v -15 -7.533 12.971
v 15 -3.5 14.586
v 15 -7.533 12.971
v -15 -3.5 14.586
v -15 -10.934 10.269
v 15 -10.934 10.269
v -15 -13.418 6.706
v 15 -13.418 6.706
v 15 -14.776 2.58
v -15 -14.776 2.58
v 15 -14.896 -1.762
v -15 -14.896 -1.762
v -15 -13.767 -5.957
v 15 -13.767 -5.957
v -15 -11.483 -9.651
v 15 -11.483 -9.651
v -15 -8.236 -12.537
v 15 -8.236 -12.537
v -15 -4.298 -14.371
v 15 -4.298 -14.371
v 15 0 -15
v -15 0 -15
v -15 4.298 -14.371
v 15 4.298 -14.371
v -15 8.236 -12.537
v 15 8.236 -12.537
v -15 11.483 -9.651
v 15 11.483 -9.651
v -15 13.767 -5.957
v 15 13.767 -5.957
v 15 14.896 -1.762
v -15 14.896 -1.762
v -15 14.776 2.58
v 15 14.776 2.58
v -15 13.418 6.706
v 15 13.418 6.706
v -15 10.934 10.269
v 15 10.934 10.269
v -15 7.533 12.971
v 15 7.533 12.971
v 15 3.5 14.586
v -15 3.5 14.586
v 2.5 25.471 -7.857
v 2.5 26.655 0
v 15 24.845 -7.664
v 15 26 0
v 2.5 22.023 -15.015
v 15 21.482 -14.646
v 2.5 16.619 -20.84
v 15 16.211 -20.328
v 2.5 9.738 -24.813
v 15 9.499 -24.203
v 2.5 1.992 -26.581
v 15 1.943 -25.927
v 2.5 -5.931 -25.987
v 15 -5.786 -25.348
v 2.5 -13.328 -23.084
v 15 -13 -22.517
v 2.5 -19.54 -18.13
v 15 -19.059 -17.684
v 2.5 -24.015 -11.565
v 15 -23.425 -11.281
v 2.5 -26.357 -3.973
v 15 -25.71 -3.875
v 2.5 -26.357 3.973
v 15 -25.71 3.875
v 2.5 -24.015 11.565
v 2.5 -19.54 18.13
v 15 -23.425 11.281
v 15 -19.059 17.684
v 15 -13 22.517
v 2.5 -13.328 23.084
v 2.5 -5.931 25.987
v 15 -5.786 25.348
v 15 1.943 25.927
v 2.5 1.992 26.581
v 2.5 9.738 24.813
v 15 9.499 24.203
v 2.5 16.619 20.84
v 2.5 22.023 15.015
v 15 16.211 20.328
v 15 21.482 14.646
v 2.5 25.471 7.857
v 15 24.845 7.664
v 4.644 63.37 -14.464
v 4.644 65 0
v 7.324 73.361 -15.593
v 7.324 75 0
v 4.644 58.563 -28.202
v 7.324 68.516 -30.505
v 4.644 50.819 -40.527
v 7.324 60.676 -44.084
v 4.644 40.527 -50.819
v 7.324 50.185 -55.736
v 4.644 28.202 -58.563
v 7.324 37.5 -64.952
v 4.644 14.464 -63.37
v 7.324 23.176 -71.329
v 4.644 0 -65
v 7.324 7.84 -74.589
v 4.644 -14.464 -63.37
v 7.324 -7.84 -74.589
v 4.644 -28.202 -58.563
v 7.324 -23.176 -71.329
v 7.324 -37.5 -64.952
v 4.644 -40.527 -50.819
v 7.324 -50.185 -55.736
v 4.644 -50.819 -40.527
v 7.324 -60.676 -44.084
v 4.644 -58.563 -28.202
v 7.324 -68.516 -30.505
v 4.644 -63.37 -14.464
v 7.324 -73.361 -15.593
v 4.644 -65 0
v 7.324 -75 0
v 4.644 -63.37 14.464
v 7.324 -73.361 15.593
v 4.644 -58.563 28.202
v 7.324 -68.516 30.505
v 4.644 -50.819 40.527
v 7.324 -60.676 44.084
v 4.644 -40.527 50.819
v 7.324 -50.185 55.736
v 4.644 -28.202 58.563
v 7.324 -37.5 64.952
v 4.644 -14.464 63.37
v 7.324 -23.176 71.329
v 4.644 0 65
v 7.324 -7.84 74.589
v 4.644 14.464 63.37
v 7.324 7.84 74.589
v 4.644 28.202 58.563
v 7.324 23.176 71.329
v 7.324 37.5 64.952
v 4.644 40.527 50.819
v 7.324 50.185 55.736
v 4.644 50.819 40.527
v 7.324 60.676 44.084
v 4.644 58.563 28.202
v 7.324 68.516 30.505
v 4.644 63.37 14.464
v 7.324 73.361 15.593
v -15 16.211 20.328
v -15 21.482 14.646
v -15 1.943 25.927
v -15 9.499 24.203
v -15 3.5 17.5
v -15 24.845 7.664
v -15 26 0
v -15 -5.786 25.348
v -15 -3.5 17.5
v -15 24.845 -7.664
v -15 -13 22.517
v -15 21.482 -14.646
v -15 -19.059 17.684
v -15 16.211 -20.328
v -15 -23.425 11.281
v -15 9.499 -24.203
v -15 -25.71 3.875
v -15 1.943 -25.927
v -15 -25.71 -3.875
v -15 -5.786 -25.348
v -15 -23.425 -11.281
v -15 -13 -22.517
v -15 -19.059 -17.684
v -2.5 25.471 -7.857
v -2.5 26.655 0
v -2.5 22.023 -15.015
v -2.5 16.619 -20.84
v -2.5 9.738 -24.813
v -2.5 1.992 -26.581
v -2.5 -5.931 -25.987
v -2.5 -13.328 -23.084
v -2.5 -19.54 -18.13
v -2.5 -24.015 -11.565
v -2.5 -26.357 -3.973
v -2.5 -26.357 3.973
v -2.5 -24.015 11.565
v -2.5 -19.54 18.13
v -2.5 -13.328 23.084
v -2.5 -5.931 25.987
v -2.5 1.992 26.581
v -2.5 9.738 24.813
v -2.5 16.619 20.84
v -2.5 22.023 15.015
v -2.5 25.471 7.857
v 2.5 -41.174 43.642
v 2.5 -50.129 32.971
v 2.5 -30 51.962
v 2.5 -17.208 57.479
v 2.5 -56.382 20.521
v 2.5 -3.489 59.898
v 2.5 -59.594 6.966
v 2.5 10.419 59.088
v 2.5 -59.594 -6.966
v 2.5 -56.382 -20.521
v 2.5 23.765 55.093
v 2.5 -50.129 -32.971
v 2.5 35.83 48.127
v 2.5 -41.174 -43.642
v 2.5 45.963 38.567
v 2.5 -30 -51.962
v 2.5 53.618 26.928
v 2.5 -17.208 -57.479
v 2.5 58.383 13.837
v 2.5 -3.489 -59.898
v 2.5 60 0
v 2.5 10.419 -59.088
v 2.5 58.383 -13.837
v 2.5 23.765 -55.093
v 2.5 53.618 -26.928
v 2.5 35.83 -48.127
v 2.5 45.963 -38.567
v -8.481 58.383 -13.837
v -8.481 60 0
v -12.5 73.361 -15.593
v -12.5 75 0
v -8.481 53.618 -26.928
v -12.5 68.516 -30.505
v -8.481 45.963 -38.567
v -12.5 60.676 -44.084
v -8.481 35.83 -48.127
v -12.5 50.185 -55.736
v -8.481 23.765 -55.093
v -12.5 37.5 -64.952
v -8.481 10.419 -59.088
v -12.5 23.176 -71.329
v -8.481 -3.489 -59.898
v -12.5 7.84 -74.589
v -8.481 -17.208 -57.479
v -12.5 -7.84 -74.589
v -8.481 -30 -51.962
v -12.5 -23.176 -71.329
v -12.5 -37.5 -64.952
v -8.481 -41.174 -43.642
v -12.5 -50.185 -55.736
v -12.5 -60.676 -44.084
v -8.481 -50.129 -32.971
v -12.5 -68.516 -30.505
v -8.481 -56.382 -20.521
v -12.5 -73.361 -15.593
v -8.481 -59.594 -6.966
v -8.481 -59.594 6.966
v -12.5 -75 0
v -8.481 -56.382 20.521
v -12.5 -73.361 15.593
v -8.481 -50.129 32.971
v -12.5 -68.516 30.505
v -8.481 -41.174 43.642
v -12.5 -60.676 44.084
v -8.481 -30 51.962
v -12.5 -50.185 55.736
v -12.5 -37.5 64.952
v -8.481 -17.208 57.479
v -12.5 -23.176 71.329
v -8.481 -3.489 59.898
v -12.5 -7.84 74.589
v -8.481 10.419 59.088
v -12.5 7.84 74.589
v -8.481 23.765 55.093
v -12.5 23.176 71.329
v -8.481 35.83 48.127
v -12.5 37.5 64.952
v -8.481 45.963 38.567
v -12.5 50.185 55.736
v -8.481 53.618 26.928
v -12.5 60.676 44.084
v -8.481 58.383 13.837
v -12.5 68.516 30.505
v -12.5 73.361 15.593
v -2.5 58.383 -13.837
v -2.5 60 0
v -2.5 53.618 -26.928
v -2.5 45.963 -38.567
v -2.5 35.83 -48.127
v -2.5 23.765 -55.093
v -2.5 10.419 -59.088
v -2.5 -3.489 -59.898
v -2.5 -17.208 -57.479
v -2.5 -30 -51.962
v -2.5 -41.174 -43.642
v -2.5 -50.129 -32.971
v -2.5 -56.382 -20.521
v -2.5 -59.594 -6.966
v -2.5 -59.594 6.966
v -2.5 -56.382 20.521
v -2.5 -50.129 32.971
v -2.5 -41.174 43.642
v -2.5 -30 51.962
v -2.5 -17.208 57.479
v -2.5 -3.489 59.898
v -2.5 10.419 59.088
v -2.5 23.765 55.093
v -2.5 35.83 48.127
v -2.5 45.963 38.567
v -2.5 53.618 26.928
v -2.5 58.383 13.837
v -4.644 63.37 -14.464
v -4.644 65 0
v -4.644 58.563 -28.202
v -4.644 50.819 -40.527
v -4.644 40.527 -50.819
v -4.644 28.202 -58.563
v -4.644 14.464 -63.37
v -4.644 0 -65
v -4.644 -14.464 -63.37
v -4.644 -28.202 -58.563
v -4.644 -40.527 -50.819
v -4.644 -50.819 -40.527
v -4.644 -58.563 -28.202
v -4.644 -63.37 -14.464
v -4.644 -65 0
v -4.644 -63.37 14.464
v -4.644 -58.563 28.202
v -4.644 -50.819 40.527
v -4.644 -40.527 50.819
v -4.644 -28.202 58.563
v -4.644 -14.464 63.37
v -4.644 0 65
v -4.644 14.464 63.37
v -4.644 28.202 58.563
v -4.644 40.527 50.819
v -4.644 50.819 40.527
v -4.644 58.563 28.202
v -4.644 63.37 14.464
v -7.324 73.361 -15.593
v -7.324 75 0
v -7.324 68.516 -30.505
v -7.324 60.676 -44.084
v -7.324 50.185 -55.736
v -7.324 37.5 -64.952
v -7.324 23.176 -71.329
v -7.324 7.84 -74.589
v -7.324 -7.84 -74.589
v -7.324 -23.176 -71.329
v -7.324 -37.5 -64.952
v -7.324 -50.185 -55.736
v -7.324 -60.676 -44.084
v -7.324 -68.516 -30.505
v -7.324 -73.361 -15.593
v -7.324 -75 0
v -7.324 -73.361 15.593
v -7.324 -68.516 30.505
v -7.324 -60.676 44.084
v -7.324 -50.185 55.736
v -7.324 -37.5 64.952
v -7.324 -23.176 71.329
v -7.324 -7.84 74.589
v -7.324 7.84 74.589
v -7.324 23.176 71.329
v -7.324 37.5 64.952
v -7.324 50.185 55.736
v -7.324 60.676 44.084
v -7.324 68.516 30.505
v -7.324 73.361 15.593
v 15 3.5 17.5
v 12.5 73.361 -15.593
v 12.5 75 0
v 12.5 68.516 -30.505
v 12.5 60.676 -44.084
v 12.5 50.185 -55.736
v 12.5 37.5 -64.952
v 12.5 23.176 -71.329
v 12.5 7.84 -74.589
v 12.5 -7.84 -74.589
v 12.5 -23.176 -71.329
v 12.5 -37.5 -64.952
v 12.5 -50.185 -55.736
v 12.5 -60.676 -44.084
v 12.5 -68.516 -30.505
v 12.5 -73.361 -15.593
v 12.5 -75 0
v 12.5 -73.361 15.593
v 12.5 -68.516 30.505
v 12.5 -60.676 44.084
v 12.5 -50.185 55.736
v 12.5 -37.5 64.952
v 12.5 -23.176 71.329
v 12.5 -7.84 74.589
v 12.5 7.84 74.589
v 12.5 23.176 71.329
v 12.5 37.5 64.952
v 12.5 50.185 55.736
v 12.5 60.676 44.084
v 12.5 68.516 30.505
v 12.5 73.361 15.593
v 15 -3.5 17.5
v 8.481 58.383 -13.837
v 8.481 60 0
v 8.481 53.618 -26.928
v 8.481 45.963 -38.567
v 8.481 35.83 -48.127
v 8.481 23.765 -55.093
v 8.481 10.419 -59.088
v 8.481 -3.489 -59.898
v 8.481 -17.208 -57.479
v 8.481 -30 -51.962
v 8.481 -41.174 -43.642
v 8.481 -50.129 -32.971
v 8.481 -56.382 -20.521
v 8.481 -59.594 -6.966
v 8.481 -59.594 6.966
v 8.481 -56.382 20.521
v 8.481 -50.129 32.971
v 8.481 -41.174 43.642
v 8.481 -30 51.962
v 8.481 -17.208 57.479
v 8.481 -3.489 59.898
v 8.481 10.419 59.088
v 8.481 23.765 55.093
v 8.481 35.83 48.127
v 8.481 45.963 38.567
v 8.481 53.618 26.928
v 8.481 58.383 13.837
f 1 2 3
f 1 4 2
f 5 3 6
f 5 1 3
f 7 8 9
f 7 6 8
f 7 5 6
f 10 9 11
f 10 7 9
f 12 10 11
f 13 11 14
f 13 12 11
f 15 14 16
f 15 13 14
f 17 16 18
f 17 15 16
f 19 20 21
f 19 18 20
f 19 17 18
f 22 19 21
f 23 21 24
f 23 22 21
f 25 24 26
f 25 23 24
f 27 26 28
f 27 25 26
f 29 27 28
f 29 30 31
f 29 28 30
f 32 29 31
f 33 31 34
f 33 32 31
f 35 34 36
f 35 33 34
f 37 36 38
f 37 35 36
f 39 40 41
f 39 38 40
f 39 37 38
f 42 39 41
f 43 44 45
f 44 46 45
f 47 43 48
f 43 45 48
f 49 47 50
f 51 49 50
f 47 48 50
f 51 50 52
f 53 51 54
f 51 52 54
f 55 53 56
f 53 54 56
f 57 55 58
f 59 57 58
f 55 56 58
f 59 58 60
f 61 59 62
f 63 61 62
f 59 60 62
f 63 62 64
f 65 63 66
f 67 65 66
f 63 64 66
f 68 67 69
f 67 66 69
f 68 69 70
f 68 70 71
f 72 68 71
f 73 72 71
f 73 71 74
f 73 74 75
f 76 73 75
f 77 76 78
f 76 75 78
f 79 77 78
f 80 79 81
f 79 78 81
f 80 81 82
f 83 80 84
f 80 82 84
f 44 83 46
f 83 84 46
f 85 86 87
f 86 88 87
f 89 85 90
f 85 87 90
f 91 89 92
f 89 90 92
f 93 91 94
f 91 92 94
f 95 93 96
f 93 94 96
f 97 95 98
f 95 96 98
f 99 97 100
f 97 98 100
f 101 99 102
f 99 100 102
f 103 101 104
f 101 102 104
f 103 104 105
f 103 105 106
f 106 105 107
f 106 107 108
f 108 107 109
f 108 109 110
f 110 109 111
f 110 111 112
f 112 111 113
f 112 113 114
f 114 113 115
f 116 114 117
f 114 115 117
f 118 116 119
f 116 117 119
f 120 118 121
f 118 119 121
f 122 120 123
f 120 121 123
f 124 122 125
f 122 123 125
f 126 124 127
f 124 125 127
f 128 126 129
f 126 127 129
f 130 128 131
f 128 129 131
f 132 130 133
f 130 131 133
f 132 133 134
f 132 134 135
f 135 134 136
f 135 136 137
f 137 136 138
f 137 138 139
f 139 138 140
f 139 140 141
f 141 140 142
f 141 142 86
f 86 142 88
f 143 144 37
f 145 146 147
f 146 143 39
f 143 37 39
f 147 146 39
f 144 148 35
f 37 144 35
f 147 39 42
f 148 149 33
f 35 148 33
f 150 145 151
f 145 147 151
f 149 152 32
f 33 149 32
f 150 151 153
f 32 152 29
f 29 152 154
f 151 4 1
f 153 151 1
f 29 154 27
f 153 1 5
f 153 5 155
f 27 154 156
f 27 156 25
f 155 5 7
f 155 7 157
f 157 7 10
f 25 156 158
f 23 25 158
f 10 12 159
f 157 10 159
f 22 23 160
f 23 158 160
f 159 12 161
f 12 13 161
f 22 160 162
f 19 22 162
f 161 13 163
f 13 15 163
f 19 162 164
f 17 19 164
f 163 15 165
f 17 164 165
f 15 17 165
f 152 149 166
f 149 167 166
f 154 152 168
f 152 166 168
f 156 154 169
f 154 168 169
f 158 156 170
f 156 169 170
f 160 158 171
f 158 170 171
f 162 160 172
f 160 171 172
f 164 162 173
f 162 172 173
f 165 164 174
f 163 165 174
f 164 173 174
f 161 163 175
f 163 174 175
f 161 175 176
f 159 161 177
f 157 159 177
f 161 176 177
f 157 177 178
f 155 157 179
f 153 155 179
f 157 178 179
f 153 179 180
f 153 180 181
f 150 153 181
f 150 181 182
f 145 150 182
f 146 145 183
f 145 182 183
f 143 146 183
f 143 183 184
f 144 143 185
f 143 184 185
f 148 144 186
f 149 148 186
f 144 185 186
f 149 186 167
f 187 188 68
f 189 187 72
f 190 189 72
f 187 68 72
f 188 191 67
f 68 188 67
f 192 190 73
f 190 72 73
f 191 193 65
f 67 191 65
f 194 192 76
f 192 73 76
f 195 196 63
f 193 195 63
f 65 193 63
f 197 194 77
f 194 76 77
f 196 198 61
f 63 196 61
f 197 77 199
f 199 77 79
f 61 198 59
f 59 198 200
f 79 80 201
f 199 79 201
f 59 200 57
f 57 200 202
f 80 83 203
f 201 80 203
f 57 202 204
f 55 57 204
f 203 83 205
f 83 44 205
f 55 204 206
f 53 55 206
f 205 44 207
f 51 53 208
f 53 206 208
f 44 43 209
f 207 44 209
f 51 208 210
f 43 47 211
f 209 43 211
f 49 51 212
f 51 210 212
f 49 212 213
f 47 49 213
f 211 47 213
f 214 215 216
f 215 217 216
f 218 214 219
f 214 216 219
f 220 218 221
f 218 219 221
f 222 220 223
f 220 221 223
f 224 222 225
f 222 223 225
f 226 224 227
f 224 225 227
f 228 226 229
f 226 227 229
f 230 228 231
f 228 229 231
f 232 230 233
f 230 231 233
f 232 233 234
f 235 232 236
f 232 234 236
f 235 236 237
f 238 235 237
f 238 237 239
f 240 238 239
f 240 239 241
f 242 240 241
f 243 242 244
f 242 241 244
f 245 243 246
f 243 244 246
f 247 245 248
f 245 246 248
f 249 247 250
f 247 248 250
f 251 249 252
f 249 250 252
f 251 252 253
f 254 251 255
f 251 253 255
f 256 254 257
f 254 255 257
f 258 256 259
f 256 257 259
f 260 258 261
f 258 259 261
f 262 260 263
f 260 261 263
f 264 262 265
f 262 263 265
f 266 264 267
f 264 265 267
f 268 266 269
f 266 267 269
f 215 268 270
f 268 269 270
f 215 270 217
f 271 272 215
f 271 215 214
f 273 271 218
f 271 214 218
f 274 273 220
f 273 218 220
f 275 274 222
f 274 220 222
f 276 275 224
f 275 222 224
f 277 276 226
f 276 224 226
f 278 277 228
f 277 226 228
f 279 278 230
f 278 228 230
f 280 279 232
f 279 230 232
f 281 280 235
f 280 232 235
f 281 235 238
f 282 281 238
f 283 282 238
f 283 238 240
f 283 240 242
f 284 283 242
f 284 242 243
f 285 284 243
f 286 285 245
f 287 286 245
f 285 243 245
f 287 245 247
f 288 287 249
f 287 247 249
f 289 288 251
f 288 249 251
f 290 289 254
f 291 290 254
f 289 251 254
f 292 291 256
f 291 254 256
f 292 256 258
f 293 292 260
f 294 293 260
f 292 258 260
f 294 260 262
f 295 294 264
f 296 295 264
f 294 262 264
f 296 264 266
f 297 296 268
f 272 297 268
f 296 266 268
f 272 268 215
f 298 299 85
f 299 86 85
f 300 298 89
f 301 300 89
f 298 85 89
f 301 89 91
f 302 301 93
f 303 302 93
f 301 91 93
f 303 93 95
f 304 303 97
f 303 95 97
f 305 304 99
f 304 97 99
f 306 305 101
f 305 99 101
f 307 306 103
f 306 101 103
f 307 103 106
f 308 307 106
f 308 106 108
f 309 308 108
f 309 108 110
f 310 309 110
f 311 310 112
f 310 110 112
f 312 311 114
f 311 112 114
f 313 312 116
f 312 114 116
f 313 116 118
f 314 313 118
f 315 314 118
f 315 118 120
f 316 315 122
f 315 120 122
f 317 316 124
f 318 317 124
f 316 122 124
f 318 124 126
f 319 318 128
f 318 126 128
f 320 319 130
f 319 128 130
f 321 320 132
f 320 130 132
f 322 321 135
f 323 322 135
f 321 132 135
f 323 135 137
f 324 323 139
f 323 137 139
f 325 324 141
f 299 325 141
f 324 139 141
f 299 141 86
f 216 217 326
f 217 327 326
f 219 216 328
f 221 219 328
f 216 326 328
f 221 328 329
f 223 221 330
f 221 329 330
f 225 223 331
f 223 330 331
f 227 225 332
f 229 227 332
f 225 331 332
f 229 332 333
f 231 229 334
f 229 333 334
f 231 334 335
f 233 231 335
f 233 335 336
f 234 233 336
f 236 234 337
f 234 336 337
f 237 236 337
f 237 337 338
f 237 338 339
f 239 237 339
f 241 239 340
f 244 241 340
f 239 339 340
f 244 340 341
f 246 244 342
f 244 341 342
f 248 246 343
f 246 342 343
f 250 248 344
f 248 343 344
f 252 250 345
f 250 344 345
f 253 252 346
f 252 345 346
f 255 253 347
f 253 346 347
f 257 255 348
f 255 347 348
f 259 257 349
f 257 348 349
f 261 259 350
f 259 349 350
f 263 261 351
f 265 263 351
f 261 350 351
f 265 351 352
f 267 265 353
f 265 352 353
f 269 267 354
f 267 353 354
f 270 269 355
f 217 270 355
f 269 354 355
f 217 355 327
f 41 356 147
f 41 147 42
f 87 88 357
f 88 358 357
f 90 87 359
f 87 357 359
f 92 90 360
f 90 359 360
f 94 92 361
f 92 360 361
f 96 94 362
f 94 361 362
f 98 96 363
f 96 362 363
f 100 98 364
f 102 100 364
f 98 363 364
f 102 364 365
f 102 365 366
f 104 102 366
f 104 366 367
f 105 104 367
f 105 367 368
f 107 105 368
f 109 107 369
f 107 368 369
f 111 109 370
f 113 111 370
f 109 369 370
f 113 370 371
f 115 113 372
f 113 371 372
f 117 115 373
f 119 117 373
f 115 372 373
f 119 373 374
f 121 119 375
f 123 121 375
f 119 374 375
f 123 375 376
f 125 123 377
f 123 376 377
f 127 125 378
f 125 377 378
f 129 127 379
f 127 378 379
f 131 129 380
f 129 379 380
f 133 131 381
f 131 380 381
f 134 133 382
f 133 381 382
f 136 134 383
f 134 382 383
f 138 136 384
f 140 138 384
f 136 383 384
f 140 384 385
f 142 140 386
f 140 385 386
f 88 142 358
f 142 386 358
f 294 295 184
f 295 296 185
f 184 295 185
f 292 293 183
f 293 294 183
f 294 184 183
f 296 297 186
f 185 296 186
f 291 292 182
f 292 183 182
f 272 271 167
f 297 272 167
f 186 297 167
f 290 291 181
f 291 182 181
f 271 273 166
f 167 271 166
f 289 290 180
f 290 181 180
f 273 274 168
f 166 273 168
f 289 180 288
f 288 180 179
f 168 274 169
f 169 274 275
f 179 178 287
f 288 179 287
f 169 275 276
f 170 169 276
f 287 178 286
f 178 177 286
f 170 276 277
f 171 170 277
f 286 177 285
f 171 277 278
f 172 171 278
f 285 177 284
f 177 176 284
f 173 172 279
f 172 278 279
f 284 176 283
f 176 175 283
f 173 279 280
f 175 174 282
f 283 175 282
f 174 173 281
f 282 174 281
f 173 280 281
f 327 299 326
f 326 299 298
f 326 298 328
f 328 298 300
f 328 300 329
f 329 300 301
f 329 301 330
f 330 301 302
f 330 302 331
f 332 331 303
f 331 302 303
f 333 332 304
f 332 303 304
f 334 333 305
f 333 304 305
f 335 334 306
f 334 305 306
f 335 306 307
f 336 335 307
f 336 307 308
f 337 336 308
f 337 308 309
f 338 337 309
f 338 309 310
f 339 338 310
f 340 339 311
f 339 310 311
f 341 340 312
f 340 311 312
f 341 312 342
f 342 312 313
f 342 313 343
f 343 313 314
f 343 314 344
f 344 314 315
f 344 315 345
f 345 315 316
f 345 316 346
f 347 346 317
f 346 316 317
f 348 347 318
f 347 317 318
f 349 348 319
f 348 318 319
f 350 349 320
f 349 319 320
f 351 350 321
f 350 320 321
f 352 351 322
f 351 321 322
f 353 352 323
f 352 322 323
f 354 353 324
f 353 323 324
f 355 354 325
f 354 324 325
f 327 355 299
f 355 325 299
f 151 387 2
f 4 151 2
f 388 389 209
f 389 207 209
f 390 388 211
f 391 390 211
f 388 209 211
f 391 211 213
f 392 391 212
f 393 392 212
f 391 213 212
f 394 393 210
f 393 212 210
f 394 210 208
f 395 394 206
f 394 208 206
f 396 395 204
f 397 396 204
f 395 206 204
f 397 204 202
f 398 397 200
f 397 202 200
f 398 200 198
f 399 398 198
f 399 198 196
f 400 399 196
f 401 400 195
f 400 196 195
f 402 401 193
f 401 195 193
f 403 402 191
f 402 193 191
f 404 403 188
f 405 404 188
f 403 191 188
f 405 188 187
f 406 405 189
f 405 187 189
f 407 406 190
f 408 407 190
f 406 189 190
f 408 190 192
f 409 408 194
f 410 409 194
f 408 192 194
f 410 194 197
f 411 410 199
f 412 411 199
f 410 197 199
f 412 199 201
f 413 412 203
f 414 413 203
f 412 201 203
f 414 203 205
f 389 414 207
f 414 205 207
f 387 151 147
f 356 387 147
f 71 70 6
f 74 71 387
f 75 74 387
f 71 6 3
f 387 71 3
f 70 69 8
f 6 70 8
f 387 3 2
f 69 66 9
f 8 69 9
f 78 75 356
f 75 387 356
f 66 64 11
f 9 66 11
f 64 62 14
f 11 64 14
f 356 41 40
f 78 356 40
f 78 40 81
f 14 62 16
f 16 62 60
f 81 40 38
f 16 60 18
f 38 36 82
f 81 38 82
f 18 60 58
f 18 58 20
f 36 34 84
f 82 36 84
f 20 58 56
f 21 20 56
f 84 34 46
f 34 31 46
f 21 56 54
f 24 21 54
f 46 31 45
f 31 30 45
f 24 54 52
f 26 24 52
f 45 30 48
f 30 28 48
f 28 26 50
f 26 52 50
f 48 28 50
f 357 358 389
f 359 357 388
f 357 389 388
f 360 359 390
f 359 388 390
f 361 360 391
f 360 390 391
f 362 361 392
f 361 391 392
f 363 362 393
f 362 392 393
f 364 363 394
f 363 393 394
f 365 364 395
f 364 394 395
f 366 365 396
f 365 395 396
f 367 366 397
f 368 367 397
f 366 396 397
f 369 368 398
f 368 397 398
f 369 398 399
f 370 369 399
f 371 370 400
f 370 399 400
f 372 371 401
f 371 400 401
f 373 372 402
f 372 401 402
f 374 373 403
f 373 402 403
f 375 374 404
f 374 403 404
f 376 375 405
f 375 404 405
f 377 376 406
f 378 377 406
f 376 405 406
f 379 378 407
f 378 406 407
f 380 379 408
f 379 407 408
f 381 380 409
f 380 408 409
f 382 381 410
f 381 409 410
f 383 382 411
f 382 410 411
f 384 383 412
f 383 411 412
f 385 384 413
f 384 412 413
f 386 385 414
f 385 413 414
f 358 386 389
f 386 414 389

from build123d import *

# Parameters (mm, degrees)
SKETCH2_R               = 15
CUT_EXTRUDE1_DEPTH      = 16
CUT_EXTRUDE1_DEPTH_BACK = 16
SKETCH3_W               = 17.5
SKETCH3_H               = 7
CUT_EXTRUDE2_DEPTH      = 16
CUT_EXTRUDE2_DEPTH_BACK = 16


with BuildPart() as part:
    # Sketch1 → Revolve1 (revolve)
    with BuildSketch(Plane.XY):
        Polygon((12.5, 75), (8.480762114, 60), (2.5, 60), (2.5, 26.655097241), (15, 26), (15, 0), (-15, 0), (-15, 26), (-2.5, 26.655097241), (-2.5, 60), (-8.480762114, 60), (-12.5, 75), (-7.323619098, 75), (-4.644127174, 65), (4.644127174, 65), (7.323619098, 75), align=None)
    revolve(axis=Axis((15, 0, 0), (-1, 0, 0)))

    # Sketch2 → Cut-Extrude1 (cut, two sides)
    with BuildSketch(Plane(origin=(0, 0, 0), x_dir=(0, 0, -1), z_dir=(1, 0, 0))) as cut_extrude1_sk:
        Circle(SKETCH2_R)
    extrude(amount=CUT_EXTRUDE1_DEPTH, mode=Mode.SUBTRACT)
    extrude(cut_extrude1_sk.sketch, amount=-CUT_EXTRUDE1_DEPTH_BACK, mode=Mode.SUBTRACT)

    # Sketch3 → Cut-Extrude2 (cut, two sides)
    with BuildSketch(Plane(origin=(0, 0, 0), x_dir=(0, 0, -1), z_dir=(1, 0, 0))) as cut_extrude2_sk:
        with Locations((-8.75, 0)):
            Rectangle(SKETCH3_W, SKETCH3_H)
    extrude(amount=CUT_EXTRUDE2_DEPTH, mode=Mode.SUBTRACT)
    extrude(cut_extrude2_sk.sketch, amount=-CUT_EXTRUDE2_DEPTH_BACK, mode=Mode.SUBTRACT)


solid = part.part
